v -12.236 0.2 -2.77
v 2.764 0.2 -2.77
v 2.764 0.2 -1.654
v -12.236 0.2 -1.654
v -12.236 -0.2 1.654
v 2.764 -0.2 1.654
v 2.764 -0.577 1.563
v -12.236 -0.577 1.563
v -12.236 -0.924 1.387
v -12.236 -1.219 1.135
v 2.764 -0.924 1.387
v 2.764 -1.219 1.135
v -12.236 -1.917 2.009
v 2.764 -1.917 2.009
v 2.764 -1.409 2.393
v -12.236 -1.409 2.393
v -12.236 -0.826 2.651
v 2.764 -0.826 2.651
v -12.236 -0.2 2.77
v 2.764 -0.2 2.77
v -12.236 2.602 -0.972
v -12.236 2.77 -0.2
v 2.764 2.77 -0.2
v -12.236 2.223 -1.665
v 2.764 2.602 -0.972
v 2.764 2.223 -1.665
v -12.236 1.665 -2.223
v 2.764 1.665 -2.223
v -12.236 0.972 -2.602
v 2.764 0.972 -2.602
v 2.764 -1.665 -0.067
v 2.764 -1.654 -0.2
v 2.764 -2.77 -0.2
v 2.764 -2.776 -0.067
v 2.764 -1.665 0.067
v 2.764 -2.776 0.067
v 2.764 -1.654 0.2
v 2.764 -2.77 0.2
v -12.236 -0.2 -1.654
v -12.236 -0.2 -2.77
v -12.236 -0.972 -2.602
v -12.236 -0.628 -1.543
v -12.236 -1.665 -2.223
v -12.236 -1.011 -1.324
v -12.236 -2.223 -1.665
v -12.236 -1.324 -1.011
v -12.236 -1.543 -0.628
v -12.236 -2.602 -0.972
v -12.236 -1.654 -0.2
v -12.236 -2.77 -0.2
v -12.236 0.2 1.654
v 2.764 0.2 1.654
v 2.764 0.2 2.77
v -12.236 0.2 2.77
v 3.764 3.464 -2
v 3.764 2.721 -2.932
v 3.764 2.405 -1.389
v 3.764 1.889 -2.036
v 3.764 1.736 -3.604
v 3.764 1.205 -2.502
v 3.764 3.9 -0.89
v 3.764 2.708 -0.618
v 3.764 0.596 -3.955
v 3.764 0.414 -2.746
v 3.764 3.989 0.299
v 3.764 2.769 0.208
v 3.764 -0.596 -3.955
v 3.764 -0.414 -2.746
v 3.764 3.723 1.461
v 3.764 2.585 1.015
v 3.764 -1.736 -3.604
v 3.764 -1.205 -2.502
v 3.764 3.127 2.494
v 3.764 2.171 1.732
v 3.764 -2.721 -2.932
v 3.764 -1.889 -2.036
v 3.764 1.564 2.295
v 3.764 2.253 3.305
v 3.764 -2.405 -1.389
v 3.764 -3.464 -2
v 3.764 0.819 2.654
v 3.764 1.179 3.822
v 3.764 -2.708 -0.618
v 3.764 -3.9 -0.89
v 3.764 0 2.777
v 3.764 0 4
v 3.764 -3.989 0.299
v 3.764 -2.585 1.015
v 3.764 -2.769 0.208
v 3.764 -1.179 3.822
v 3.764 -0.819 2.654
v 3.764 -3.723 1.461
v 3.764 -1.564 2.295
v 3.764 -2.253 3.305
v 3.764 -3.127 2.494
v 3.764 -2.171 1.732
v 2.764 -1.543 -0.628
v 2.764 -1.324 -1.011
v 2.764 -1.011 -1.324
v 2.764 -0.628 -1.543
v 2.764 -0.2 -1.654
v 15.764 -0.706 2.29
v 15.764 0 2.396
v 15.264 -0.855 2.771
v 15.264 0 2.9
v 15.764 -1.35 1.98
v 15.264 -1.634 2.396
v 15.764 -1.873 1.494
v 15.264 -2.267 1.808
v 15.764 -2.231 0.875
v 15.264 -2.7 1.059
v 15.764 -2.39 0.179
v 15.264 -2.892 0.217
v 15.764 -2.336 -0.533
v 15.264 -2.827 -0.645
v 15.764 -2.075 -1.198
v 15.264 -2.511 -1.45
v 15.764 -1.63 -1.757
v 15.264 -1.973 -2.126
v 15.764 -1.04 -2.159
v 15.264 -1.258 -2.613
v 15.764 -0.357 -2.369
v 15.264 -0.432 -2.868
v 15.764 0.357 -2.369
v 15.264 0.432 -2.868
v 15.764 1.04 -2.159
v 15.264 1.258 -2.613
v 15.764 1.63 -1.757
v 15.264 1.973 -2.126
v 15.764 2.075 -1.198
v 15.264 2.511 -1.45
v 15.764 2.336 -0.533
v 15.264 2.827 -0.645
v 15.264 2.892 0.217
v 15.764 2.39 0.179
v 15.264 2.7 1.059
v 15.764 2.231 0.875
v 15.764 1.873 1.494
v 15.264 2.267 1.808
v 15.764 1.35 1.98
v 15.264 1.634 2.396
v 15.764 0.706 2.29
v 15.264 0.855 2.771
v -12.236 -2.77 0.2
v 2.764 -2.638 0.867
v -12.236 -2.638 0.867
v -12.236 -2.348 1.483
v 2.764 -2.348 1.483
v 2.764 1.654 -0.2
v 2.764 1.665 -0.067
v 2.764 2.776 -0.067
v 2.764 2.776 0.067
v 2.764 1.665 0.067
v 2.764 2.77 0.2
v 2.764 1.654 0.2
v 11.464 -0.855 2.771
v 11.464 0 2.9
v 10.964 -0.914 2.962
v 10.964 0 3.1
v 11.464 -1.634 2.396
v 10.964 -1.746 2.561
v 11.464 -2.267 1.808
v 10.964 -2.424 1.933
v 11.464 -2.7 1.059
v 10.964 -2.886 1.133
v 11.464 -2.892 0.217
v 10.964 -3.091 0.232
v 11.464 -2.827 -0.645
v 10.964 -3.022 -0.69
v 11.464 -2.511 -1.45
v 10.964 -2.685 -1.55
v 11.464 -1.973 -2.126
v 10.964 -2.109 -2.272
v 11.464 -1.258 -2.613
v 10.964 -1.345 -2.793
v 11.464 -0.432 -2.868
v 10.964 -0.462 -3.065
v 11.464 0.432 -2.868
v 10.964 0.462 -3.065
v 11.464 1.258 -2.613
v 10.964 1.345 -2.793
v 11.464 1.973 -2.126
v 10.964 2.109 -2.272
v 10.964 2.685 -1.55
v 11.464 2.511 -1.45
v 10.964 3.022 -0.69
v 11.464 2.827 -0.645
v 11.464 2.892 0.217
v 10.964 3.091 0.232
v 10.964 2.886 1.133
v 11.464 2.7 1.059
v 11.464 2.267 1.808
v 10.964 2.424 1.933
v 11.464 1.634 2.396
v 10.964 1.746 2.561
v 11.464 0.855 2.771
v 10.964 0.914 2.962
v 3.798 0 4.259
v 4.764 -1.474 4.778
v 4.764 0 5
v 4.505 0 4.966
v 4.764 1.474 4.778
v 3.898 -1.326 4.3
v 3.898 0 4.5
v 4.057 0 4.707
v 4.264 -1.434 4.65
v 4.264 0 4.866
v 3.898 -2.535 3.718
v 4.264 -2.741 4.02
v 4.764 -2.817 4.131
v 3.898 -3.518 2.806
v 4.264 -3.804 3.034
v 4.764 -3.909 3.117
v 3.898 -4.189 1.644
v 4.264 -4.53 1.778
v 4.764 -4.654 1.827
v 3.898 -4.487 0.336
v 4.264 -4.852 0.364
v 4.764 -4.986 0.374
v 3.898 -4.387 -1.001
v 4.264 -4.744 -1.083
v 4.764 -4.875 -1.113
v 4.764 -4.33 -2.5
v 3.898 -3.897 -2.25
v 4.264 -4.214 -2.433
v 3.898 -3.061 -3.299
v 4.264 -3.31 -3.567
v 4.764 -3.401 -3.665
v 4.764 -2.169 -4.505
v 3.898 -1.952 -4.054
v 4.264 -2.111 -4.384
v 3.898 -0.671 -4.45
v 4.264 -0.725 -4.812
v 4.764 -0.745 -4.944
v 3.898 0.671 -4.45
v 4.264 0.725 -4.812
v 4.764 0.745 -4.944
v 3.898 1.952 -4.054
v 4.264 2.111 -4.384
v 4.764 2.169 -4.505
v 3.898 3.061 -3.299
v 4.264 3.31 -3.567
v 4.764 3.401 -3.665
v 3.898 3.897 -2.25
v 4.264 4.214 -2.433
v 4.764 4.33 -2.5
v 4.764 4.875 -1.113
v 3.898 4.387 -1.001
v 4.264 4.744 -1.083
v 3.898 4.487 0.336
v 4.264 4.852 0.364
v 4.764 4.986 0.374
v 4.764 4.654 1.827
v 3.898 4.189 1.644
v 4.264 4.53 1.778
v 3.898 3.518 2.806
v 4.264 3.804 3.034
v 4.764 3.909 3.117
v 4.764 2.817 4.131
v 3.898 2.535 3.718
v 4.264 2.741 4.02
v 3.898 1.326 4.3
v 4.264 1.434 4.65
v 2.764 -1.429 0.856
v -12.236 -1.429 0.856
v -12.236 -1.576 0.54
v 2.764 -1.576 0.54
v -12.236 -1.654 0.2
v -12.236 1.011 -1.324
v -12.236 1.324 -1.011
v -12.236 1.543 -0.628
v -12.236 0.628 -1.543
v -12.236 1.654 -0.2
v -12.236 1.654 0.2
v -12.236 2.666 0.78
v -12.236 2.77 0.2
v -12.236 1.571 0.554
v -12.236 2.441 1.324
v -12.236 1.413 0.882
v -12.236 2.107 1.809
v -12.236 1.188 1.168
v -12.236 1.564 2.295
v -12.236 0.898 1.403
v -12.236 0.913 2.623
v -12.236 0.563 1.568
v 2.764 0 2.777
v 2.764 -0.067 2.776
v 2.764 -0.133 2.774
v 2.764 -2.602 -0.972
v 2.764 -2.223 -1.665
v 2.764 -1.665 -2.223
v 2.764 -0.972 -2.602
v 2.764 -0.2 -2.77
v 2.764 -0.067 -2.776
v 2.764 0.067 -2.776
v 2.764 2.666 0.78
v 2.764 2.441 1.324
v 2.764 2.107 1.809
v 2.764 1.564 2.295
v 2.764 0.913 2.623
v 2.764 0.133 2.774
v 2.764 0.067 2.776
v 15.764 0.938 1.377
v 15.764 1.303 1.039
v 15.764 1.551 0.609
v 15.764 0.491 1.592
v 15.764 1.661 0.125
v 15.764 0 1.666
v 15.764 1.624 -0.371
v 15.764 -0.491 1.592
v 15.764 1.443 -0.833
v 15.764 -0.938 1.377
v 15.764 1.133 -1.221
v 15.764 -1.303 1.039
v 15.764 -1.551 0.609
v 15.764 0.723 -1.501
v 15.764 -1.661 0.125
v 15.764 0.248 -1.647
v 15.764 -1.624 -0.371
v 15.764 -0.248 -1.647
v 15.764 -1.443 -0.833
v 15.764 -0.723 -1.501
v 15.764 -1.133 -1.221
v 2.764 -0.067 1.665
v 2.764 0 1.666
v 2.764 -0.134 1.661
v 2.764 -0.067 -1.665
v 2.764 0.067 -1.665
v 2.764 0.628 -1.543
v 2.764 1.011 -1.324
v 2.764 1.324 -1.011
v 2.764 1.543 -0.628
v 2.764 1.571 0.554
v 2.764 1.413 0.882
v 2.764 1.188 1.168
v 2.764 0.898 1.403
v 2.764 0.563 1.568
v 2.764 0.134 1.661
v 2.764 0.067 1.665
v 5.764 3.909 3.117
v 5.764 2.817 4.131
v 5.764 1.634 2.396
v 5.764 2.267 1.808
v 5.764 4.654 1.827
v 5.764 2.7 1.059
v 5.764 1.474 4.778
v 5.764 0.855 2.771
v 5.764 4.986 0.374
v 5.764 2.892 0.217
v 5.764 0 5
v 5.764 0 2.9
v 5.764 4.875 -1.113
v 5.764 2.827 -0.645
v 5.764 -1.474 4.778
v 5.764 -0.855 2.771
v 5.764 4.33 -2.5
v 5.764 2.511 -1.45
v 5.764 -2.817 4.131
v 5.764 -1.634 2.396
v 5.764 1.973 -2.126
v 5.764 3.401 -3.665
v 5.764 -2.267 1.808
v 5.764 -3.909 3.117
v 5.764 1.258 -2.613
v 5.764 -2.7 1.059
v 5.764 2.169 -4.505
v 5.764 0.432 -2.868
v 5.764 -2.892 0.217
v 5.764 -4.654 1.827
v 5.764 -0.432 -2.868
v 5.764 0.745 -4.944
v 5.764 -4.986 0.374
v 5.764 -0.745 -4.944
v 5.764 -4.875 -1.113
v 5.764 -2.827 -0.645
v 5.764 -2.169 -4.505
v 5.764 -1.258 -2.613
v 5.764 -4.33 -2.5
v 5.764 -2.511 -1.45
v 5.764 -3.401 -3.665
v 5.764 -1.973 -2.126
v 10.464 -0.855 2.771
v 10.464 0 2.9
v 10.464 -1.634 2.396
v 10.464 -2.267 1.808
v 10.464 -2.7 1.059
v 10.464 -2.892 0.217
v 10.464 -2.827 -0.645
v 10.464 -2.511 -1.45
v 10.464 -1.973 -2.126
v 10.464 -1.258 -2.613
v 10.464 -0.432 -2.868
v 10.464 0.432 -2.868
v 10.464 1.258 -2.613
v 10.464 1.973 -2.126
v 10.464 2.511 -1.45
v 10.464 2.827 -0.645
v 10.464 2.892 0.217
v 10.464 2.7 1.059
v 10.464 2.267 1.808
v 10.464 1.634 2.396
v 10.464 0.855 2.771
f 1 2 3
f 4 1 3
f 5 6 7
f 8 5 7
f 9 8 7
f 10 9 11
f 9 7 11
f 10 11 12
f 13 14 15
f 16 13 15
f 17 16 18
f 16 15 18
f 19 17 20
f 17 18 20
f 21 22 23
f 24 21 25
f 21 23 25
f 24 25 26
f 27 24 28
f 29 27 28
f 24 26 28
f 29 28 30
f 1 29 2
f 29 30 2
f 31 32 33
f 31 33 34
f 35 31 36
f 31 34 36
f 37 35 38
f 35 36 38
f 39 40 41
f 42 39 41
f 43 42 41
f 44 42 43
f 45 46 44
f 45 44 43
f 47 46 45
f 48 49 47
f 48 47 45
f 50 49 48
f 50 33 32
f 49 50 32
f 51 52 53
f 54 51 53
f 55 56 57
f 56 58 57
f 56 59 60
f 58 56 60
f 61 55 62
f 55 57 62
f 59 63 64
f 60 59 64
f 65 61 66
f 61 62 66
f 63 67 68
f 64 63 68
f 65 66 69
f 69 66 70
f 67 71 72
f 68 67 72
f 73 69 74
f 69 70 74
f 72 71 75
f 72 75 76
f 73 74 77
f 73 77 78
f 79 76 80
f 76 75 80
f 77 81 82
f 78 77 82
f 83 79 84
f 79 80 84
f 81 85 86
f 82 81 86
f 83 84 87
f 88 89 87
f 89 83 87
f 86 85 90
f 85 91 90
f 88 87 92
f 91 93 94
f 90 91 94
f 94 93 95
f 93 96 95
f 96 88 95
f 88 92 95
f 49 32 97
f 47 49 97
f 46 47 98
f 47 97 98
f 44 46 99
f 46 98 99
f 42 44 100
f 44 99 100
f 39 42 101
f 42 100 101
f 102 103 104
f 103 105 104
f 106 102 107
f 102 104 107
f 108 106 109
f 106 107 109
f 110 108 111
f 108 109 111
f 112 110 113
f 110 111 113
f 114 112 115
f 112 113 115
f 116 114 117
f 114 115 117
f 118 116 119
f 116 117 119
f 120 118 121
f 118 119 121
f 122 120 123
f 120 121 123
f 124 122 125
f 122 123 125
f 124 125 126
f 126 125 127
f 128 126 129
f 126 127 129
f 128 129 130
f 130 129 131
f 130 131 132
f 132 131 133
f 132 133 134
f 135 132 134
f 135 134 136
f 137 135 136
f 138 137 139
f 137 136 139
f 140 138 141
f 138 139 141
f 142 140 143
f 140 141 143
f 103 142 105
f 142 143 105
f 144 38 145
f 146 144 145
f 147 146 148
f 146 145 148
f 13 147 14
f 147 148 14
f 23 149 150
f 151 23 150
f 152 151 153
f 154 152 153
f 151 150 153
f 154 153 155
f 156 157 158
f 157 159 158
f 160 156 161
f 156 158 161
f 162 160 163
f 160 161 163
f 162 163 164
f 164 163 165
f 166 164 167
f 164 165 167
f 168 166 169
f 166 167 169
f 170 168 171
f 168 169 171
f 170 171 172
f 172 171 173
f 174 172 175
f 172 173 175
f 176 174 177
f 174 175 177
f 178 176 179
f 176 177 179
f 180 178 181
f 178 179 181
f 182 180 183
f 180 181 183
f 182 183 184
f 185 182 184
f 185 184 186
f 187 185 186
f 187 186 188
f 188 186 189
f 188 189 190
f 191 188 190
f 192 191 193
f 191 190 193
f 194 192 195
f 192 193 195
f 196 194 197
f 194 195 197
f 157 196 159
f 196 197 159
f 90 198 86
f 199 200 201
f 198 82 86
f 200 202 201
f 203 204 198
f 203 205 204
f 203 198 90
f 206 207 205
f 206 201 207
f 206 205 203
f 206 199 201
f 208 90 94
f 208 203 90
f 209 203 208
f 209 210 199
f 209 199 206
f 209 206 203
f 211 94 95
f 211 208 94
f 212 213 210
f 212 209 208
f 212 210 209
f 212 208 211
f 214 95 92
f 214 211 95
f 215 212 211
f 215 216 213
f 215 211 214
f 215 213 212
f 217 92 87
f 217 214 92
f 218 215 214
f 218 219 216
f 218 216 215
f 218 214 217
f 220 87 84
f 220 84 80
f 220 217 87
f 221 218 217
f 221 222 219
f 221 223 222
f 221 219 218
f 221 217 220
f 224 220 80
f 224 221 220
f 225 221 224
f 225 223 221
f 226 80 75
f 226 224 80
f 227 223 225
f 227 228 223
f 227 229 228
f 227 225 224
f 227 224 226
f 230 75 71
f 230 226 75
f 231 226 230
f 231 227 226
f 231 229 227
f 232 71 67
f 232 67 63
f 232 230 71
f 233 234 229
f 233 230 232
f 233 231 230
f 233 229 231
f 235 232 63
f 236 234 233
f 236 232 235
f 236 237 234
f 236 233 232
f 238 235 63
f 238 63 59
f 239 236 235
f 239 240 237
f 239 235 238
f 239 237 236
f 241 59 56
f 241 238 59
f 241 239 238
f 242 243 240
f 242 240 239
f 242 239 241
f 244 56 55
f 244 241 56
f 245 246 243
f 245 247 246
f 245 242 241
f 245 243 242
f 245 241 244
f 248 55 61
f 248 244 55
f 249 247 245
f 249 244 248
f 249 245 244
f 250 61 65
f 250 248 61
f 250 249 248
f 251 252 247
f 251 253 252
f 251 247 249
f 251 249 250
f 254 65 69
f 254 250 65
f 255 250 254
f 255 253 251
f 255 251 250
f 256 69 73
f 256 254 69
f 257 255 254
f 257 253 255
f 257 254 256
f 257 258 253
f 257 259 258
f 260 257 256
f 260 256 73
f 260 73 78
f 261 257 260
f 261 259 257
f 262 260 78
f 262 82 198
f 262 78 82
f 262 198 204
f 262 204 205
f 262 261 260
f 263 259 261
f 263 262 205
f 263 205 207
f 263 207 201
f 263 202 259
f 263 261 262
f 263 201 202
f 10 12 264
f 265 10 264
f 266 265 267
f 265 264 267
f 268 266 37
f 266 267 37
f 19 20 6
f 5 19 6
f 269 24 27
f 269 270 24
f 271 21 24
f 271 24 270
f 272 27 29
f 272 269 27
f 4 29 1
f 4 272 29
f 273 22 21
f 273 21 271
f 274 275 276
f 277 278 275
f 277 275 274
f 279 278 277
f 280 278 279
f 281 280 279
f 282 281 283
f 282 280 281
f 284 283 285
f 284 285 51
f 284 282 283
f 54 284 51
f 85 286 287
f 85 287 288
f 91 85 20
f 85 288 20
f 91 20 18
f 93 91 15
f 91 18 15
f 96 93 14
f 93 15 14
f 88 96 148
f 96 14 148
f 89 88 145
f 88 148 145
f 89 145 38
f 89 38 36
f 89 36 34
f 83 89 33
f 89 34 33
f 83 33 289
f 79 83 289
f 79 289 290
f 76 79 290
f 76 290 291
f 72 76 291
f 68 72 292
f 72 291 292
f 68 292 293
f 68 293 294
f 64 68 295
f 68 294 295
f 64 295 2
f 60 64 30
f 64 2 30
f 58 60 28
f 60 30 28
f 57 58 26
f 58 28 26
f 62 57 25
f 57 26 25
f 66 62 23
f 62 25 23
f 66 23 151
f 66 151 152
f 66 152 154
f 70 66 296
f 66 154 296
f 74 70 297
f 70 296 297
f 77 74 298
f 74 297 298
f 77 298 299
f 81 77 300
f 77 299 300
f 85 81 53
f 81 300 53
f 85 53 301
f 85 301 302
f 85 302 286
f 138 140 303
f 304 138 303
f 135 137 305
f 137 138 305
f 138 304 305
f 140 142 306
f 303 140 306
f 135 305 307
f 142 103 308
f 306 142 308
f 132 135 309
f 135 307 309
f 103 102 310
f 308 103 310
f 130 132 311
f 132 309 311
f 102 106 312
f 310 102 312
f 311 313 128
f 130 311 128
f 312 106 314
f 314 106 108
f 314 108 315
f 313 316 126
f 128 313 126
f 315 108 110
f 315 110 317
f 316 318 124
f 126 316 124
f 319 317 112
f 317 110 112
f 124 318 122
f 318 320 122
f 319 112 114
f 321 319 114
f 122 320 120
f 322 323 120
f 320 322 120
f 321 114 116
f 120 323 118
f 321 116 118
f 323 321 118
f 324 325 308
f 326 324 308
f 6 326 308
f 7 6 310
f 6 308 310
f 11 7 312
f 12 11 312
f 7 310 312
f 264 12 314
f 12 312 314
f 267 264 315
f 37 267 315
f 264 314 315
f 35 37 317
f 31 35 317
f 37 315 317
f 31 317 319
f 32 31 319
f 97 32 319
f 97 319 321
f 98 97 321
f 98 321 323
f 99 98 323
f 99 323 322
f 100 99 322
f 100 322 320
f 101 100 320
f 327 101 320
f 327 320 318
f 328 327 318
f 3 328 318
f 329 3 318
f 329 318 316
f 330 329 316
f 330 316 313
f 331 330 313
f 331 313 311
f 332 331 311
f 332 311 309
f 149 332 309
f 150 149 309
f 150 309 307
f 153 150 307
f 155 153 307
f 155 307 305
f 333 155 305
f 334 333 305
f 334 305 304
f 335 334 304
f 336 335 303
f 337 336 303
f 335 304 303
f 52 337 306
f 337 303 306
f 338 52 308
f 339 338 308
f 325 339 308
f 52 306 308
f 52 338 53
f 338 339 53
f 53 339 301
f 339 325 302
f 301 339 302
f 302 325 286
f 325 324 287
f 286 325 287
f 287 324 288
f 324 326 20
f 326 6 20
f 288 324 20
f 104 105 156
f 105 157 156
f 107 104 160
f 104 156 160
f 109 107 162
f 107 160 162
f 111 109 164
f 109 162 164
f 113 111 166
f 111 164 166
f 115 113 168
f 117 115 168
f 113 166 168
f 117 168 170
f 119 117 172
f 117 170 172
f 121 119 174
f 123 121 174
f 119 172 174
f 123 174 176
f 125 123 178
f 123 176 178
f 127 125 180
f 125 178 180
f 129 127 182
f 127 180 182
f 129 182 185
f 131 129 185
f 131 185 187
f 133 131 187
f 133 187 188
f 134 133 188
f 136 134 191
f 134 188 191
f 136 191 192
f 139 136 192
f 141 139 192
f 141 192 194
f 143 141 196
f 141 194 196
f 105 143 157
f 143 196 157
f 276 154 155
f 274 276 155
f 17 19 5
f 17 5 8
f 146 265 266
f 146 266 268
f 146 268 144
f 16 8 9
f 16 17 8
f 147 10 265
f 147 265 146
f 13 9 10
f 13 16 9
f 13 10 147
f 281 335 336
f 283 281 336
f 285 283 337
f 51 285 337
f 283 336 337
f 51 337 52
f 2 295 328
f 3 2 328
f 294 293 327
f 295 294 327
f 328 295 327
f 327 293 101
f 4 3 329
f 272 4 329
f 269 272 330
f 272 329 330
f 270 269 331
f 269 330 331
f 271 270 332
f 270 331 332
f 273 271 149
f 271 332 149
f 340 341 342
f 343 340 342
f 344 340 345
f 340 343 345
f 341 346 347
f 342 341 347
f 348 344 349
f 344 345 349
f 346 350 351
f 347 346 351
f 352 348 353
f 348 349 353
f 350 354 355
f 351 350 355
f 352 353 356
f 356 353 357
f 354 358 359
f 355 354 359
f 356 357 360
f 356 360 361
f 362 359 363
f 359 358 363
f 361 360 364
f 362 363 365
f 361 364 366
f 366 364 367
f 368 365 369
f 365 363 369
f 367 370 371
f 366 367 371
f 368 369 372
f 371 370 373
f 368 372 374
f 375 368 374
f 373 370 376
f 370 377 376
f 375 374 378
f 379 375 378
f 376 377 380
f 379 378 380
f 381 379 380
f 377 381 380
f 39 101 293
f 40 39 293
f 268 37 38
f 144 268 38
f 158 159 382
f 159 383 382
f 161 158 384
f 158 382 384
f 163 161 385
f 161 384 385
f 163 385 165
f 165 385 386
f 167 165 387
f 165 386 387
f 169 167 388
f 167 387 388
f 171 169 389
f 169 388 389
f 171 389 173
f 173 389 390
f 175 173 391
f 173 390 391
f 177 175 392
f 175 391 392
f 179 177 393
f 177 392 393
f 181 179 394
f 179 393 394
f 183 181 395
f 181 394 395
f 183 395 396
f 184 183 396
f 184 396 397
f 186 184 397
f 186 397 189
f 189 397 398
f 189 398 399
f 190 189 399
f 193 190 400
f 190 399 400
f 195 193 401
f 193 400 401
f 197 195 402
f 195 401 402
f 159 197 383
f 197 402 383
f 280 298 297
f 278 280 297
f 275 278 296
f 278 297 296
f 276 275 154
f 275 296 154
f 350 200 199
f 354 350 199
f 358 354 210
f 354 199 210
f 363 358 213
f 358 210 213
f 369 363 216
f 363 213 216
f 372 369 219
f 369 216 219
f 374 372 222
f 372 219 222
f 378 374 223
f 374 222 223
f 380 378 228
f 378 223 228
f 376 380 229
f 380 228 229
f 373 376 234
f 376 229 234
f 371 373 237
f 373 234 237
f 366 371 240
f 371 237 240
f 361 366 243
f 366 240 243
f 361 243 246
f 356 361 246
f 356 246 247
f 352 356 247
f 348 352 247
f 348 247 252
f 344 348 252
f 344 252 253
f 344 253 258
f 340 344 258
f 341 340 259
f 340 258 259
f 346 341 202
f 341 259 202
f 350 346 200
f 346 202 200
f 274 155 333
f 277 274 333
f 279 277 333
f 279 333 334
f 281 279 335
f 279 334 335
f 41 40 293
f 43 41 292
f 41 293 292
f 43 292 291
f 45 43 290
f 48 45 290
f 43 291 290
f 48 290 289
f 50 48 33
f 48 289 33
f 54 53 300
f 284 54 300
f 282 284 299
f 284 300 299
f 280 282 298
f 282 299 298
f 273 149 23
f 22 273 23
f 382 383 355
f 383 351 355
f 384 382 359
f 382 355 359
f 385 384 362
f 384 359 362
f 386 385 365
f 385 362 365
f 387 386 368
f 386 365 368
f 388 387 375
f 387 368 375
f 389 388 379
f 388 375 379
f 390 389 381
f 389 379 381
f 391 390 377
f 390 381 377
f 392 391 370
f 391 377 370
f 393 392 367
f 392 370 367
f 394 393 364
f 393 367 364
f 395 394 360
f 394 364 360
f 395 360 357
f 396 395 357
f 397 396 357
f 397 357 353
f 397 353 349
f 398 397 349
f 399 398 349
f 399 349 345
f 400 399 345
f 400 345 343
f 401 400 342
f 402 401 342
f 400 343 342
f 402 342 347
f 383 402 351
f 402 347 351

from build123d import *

# Parameters (mm, degrees)
F3_DEPTH = 15
F4_DEPTH = 15
F5_DEPTH = 15
F7_R     = 1


# Not quite as in the source:
# - after a boolean that leaves OpenCascade's solid faulty, fix() repairs it
# - a feature of the source that left no trace in its solid (it failed there, or was rolled back) is left out


with BuildPart() as f1:
    # F0 (on Front) → F1 (revolve)
    with BuildSketch(Plane.XZ):
        Polygon((2.7639019594, 2.7772041211), (2.7639019594, 1.666), (15.7639019594, 1.666), (15.7639019594, 2.3962433916), (15.2639019594, 2.9), (11.4639019594, 2.9), (10.9639019594, 3.1), (10.4639019594, 2.9), (5.7639019594, 2.9), (5.7639019594, 5), (3.7639019594, 5), (3.7639019594, 2.7772041211), align=None)
    revolve(axis=Axis((8.0730360566, 0, 0), (1, 0, 0)))

    # F2 (on face) → F3 (join)
    with BuildSketch(Plane(origin=(2.7639019594, 0, 0), x_dir=(0, -1, 0), z_dir=(-1, 0, 0))):
        with BuildLine():
            ThreePointArc((-1.1878670343, 1.1681300907), (-0.7352206258, 1.4949938566), (-0.2, 1.6539516317))
            Line((-0.2, 1.6539516317), (-0.2, 2.7699932726))
            ThreePointArc((-0.2, 2.7699932726), (-1.249471885, 2.4802586032), (-2.1069209339, 1.8093498579))
            ThreePointArc((-2.1069209339, 1.8093498579), (-2.5677957056, 1.0579640563), (-2.7699932726, 0.2))
            Line((-2.7699932726, 0.2), (-1.6539516317, 0.2))
            ThreePointArc((-1.6539516317, 0.2), (-1.5011003633, 0.7226712249), (-1.1878670343, 1.1681300907))
        make_face()
    extrude(amount=F3_DEPTH)

    # F2 (on face) → F4 (join)
    with BuildSketch(Plane(origin=(2.7639019594, 0, 0), x_dir=(0, -1, 0), z_dir=(-1, 0, 0))):
        with BuildLine():
            Line((0.2, 2.7699932726), (0.2, 1.6539516317))
            ThreePointArc((0.2, 1.6539516317), (0.75564146, 1.4847767455), (1.2194377654, 1.1351332681))
            ThreePointArc((1.2194377654, 1.1351332681), (1.5108640621, 0.7020297614), (1.6539516317, 0.2))
            Line((1.6539516317, 0.2), (2.7699932726, 0.2))
            ThreePointArc((2.7699932726, 0.2), (2.5121240066, 1.1841012226), (1.917164961, 2.0093136247))
            ThreePointArc((1.917164961, 2.0093136247), (1.1248356545, 2.5392139493), (0.2, 2.7699932726))
        make_face()
    extrude(amount=F4_DEPTH)

    # F2 (on face) → F5 (join)
    with BuildSketch(Plane(origin=(2.7639019594, 0, 0), x_dir=(0, -1, 0), z_dir=(-1, 0, 0))):
        with BuildLine():
            ThreePointArc((-1.1878670343, 1.1681300907), (-0.7352206258, 1.4949938566), (-0.2, 1.6539516317))
            Line((-0.2, 1.6539516317), (-0.2, 2.7699932726))
            ThreePointArc((-0.2, 2.7699932726), (-1.249471885, 2.4802586032), (-2.1069209339, 1.8093498579))
            ThreePointArc((-2.1069209339, 1.8093498579), (-2.5677957056, 1.0579640563), (-2.7699932726, 0.2))
            Line((-2.7699932726, 0.2), (-1.6539516317, 0.2))
            ThreePointArc((-1.6539516317, 0.2), (-1.5011003633, 0.7226712249), (-1.1878670343, 1.1681300907))
        make_face()
        with BuildLine():
            Line((0.2, 2.7699932726), (0.2, 1.6539516317))
            ThreePointArc((0.2, 1.6539516317), (0.75564146, 1.4847767455), (1.2194377654, 1.1351332681))
            ThreePointArc((1.2194377654, 1.1351332681), (1.5108640621, 0.7020297614), (1.6539516317, 0.2))
            Line((1.6539516317, 0.2), (2.7699932726, 0.2))
            ThreePointArc((2.7699932726, 0.2), (2.5121240066, 1.1841012226), (1.917164961, 2.0093136247))
            ThreePointArc((1.917164961, 2.0093136247), (1.1248356545, 2.5392139493), (0.2, 2.7699932726))
        make_face()
        with BuildLine():
            ThreePointArc((-0.2, -1.6539516317), (-1.1780398975, -1.1780398975), (-1.6539516317, -0.2))
            Line((-1.6539516317, -0.2), (-2.7699932726, -0.2))
            ThreePointArc((-2.7699932726, -0.2), (-1.9637798667, -1.9637798667), (-0.2, -2.7699932726))
            Line((-0.2, -2.7699932726), (-0.2, -1.6539516317))
        make_face()
        with BuildLine():
            Line((2.7699932726, -0.2), (1.6539516317, -0.2))
            ThreePointArc((1.6539516317, -0.2), (1.1780398975, -1.1780398975), (0.2, -1.6539516317))
            Line((0.2, -1.6539516317), (0.2, -2.7699932726))
            ThreePointArc((0.2, -2.7699932726), (1.9637798667, -1.9637798667), (2.7699932726, -0.2))
        make_face()
    extrude(amount=F5_DEPTH)

    add(f1.part.fix(), mode=Mode.REPLACE)

    # F7
    f7_edges = [f1.edges().sort_by_distance(p)[0] for p in [
        (3.763902, 0, -5),
    ]]
    fillet(f7_edges, radius=F7_R)


solid = f1.part
